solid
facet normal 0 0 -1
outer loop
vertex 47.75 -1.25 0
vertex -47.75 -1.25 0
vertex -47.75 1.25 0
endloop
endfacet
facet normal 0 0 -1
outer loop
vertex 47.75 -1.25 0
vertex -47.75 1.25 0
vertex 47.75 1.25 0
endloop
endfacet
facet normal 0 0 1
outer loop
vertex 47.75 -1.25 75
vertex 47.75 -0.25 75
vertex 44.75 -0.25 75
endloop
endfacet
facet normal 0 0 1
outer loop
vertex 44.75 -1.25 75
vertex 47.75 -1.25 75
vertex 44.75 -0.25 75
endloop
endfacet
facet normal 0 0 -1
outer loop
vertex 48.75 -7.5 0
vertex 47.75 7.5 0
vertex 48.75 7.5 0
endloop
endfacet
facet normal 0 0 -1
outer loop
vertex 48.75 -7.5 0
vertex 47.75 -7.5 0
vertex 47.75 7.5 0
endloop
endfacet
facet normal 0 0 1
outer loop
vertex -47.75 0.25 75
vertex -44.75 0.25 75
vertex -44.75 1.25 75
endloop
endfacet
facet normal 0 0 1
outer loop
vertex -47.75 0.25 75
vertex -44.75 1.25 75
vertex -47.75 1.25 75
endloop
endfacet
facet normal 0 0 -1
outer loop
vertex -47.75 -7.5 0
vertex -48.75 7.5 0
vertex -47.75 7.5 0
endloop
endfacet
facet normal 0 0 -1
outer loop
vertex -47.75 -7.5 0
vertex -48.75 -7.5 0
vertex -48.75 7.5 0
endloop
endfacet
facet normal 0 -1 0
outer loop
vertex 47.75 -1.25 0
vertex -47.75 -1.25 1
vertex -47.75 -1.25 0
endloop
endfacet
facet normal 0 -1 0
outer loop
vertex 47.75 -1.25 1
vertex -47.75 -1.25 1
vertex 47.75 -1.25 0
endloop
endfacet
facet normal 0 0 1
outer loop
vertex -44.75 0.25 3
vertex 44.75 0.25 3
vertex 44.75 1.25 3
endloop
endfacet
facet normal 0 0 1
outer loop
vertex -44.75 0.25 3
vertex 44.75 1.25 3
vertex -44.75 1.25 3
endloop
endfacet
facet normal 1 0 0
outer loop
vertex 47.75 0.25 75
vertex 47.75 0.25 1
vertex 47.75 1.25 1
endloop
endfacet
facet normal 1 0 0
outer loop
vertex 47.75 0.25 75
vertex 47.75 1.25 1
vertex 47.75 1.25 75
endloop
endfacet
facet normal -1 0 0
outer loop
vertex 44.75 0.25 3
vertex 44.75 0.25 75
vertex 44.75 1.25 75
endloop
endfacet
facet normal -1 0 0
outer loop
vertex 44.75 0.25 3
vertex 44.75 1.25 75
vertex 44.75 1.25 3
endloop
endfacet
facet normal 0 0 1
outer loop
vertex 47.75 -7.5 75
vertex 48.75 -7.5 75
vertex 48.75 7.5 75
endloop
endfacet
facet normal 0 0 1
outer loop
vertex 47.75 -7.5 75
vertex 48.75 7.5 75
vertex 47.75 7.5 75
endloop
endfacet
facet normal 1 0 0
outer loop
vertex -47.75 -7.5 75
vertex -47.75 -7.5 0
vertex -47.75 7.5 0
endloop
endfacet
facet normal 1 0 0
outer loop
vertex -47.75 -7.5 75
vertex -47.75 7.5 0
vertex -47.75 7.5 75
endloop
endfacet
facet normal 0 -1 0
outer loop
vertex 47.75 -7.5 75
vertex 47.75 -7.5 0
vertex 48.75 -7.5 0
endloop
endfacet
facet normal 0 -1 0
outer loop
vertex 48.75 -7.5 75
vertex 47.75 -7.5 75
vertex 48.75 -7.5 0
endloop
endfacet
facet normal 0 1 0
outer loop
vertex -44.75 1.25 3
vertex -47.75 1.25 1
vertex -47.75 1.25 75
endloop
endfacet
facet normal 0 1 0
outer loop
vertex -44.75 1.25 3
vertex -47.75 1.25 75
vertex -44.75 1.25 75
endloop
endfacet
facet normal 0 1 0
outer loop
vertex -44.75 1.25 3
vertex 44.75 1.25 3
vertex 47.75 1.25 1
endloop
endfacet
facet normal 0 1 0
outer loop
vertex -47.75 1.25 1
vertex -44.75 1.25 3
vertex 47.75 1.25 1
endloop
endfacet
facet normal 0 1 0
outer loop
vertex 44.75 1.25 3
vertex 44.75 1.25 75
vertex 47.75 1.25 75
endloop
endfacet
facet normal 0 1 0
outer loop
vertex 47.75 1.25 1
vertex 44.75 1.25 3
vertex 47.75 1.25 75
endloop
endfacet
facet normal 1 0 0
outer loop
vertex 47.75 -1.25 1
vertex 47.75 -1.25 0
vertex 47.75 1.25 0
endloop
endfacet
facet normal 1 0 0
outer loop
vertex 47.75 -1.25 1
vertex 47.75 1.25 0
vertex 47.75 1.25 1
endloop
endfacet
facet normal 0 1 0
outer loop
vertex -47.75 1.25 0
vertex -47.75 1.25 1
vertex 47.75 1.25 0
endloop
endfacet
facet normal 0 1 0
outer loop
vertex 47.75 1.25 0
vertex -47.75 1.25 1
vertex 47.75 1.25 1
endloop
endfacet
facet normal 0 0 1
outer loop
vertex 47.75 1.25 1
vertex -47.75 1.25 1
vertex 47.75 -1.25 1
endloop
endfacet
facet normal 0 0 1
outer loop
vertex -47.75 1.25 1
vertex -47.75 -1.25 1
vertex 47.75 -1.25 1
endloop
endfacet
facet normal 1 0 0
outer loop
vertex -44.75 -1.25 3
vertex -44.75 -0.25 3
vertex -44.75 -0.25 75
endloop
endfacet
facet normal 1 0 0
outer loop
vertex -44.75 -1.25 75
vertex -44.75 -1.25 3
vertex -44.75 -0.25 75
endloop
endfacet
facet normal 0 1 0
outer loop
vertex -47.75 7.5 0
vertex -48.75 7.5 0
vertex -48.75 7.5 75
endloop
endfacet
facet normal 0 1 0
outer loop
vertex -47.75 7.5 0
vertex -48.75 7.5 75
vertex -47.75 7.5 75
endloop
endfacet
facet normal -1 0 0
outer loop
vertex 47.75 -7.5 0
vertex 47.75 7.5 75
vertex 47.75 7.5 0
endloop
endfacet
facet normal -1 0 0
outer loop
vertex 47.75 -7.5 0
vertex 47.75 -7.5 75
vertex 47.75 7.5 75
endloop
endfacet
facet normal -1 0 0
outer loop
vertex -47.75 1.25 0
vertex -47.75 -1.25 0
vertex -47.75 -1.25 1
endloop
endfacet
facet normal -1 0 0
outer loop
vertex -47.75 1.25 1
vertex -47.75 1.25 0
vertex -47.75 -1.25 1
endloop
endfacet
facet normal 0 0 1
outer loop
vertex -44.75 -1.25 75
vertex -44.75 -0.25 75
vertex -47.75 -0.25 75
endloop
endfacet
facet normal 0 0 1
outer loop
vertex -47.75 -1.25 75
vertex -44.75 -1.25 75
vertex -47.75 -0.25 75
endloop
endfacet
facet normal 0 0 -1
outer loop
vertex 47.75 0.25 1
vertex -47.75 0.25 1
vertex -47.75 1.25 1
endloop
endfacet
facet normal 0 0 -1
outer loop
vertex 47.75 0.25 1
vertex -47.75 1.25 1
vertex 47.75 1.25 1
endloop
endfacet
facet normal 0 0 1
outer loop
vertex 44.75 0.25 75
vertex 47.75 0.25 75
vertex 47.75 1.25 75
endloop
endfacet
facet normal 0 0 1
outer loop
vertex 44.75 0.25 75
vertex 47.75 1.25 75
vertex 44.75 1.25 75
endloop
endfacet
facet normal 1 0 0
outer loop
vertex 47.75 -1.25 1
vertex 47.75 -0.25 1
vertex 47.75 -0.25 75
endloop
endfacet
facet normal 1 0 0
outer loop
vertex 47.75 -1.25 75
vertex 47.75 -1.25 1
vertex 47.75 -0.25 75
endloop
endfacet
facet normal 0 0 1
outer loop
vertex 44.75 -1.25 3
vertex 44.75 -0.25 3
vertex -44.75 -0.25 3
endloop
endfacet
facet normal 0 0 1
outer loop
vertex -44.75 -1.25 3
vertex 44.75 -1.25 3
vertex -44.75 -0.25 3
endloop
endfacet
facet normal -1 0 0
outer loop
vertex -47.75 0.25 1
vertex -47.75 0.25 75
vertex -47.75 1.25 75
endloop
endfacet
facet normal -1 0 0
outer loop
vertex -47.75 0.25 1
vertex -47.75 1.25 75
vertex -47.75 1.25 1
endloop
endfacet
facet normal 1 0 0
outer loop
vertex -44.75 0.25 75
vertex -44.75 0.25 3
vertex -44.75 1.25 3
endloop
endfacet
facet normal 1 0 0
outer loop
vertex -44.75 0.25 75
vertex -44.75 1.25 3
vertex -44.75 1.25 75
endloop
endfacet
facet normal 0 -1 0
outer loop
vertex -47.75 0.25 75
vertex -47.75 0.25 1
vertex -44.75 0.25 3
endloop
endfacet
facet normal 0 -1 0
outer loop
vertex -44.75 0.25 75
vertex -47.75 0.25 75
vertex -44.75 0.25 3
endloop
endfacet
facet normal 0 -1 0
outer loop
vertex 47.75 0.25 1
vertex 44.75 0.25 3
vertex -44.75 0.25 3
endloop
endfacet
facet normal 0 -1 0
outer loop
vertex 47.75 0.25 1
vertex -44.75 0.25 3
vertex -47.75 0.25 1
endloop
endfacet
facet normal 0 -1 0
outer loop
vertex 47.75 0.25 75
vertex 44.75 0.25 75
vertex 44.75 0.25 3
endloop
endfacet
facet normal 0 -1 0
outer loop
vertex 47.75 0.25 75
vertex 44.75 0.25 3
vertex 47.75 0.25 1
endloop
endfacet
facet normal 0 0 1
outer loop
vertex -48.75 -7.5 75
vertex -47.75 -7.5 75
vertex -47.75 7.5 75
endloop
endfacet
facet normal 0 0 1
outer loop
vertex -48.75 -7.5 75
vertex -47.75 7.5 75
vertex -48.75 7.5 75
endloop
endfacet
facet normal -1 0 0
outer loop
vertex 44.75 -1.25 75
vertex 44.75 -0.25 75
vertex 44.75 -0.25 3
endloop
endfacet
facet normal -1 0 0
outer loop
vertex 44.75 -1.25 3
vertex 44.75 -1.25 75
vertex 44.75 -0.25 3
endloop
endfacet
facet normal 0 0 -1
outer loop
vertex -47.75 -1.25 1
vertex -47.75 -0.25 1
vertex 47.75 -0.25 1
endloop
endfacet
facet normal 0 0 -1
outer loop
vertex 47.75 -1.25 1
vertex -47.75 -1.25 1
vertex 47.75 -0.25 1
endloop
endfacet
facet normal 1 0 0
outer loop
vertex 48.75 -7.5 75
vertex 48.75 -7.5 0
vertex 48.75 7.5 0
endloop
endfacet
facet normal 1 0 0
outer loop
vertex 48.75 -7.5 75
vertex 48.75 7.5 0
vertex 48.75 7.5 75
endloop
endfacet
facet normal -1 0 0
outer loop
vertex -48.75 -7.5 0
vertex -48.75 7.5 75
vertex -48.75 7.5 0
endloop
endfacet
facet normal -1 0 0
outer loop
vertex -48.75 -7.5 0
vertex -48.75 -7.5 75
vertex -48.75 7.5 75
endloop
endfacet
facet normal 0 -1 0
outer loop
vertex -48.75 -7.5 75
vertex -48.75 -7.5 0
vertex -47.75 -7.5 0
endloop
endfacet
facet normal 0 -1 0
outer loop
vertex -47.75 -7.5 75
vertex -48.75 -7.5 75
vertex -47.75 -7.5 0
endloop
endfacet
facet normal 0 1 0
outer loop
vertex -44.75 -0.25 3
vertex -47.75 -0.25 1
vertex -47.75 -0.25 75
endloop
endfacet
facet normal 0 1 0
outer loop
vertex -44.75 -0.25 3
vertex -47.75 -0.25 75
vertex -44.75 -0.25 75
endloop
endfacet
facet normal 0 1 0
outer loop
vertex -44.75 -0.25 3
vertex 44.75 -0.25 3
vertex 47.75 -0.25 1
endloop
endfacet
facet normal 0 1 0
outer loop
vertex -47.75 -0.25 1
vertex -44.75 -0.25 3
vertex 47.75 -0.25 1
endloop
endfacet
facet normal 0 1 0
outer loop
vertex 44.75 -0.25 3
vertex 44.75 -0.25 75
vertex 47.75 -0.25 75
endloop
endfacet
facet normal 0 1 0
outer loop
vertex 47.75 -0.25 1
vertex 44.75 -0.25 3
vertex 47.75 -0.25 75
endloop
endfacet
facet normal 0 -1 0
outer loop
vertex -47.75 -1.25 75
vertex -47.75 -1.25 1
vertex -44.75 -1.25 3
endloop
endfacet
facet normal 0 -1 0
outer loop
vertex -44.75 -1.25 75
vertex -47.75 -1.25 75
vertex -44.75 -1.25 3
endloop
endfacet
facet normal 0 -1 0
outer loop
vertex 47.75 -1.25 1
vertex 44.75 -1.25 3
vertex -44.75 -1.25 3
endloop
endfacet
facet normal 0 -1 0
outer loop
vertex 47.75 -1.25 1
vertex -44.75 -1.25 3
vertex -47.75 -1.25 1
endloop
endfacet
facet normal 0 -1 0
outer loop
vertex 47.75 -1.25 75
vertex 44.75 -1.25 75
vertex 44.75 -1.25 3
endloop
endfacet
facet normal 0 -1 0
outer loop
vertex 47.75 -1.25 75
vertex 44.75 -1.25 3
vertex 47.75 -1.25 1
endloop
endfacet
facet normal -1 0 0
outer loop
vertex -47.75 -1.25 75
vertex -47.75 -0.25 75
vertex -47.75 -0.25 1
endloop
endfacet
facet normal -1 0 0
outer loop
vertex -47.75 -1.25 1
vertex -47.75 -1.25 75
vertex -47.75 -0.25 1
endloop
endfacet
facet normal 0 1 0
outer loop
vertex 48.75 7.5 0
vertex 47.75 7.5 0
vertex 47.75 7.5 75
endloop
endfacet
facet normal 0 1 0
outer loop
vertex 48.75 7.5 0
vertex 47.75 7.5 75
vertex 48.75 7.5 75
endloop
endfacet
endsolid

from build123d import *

# Parameters (mm, degrees)
F1_DEPTH = 7.5
F0_W     = 95.5
F0_H     = 1
F2_DEPTH = 1.25
F3_START = 0.25
F3_DEPTH = 1
F4_START = -0.25
F4_DEPTH = 1


with BuildPart() as f1:
    # F0 (on Front) → F1 (new body, symmetric)
    with BuildSketch(Plane.XZ):
        Polygon((-48.75, 0), (-47.75, 0), (-47.75, 1), (-47.75, 75), (-48.75, 75), align=None)
    extrude(amount=F1_DEPTH, both=True)


with BuildPart() as f1b:
    # F0 (on Front) → F1, piece 2 (new body, symmetric)
    with BuildSketch(Plane.XZ):
        Polygon((47.75, 1), (47.75, 0), (48.75, 0), (48.75, 75), (47.75, 75), align=None)
    extrude(amount=F1_DEPTH, both=True)


with BuildPart() as f2:
    # F0 (on Front) → F2 (new body, symmetric)
    with BuildSketch(Plane.XZ):
        with Locations((0, 0.5)):
            Rectangle(F0_W, F0_H)
    extrude(amount=F2_DEPTH, both=True)


with BuildPart() as f3:
    # F0 (on Front) → F3 (new body)
    with BuildSketch(Plane.XZ.offset(F3_START)):
        Polygon((-47.75, 75), (-47.75, 1), (47.75, 1), (47.75, 75), (44.75, 75), (44.75, 3), (0, 3), (-44.75, 3), (-44.75, 75), align=None)
    extrude(amount=F3_DEPTH)


with BuildPart() as f4:
    # F0 (on Front) → F4 (new body)
    with BuildSketch(Plane.XZ.offset(F4_START)):
        Polygon((-47.75, 75), (-47.75, 1), (47.75, 1), (47.75, 75), (44.75, 75), (44.75, 3), (0, 3), (-44.75, 3), (-44.75, 75), align=None)
    extrude(amount=-F4_DEPTH)


solid = Compound([f1.part, f1b.part, f2.part, f3.part, f4.part])
